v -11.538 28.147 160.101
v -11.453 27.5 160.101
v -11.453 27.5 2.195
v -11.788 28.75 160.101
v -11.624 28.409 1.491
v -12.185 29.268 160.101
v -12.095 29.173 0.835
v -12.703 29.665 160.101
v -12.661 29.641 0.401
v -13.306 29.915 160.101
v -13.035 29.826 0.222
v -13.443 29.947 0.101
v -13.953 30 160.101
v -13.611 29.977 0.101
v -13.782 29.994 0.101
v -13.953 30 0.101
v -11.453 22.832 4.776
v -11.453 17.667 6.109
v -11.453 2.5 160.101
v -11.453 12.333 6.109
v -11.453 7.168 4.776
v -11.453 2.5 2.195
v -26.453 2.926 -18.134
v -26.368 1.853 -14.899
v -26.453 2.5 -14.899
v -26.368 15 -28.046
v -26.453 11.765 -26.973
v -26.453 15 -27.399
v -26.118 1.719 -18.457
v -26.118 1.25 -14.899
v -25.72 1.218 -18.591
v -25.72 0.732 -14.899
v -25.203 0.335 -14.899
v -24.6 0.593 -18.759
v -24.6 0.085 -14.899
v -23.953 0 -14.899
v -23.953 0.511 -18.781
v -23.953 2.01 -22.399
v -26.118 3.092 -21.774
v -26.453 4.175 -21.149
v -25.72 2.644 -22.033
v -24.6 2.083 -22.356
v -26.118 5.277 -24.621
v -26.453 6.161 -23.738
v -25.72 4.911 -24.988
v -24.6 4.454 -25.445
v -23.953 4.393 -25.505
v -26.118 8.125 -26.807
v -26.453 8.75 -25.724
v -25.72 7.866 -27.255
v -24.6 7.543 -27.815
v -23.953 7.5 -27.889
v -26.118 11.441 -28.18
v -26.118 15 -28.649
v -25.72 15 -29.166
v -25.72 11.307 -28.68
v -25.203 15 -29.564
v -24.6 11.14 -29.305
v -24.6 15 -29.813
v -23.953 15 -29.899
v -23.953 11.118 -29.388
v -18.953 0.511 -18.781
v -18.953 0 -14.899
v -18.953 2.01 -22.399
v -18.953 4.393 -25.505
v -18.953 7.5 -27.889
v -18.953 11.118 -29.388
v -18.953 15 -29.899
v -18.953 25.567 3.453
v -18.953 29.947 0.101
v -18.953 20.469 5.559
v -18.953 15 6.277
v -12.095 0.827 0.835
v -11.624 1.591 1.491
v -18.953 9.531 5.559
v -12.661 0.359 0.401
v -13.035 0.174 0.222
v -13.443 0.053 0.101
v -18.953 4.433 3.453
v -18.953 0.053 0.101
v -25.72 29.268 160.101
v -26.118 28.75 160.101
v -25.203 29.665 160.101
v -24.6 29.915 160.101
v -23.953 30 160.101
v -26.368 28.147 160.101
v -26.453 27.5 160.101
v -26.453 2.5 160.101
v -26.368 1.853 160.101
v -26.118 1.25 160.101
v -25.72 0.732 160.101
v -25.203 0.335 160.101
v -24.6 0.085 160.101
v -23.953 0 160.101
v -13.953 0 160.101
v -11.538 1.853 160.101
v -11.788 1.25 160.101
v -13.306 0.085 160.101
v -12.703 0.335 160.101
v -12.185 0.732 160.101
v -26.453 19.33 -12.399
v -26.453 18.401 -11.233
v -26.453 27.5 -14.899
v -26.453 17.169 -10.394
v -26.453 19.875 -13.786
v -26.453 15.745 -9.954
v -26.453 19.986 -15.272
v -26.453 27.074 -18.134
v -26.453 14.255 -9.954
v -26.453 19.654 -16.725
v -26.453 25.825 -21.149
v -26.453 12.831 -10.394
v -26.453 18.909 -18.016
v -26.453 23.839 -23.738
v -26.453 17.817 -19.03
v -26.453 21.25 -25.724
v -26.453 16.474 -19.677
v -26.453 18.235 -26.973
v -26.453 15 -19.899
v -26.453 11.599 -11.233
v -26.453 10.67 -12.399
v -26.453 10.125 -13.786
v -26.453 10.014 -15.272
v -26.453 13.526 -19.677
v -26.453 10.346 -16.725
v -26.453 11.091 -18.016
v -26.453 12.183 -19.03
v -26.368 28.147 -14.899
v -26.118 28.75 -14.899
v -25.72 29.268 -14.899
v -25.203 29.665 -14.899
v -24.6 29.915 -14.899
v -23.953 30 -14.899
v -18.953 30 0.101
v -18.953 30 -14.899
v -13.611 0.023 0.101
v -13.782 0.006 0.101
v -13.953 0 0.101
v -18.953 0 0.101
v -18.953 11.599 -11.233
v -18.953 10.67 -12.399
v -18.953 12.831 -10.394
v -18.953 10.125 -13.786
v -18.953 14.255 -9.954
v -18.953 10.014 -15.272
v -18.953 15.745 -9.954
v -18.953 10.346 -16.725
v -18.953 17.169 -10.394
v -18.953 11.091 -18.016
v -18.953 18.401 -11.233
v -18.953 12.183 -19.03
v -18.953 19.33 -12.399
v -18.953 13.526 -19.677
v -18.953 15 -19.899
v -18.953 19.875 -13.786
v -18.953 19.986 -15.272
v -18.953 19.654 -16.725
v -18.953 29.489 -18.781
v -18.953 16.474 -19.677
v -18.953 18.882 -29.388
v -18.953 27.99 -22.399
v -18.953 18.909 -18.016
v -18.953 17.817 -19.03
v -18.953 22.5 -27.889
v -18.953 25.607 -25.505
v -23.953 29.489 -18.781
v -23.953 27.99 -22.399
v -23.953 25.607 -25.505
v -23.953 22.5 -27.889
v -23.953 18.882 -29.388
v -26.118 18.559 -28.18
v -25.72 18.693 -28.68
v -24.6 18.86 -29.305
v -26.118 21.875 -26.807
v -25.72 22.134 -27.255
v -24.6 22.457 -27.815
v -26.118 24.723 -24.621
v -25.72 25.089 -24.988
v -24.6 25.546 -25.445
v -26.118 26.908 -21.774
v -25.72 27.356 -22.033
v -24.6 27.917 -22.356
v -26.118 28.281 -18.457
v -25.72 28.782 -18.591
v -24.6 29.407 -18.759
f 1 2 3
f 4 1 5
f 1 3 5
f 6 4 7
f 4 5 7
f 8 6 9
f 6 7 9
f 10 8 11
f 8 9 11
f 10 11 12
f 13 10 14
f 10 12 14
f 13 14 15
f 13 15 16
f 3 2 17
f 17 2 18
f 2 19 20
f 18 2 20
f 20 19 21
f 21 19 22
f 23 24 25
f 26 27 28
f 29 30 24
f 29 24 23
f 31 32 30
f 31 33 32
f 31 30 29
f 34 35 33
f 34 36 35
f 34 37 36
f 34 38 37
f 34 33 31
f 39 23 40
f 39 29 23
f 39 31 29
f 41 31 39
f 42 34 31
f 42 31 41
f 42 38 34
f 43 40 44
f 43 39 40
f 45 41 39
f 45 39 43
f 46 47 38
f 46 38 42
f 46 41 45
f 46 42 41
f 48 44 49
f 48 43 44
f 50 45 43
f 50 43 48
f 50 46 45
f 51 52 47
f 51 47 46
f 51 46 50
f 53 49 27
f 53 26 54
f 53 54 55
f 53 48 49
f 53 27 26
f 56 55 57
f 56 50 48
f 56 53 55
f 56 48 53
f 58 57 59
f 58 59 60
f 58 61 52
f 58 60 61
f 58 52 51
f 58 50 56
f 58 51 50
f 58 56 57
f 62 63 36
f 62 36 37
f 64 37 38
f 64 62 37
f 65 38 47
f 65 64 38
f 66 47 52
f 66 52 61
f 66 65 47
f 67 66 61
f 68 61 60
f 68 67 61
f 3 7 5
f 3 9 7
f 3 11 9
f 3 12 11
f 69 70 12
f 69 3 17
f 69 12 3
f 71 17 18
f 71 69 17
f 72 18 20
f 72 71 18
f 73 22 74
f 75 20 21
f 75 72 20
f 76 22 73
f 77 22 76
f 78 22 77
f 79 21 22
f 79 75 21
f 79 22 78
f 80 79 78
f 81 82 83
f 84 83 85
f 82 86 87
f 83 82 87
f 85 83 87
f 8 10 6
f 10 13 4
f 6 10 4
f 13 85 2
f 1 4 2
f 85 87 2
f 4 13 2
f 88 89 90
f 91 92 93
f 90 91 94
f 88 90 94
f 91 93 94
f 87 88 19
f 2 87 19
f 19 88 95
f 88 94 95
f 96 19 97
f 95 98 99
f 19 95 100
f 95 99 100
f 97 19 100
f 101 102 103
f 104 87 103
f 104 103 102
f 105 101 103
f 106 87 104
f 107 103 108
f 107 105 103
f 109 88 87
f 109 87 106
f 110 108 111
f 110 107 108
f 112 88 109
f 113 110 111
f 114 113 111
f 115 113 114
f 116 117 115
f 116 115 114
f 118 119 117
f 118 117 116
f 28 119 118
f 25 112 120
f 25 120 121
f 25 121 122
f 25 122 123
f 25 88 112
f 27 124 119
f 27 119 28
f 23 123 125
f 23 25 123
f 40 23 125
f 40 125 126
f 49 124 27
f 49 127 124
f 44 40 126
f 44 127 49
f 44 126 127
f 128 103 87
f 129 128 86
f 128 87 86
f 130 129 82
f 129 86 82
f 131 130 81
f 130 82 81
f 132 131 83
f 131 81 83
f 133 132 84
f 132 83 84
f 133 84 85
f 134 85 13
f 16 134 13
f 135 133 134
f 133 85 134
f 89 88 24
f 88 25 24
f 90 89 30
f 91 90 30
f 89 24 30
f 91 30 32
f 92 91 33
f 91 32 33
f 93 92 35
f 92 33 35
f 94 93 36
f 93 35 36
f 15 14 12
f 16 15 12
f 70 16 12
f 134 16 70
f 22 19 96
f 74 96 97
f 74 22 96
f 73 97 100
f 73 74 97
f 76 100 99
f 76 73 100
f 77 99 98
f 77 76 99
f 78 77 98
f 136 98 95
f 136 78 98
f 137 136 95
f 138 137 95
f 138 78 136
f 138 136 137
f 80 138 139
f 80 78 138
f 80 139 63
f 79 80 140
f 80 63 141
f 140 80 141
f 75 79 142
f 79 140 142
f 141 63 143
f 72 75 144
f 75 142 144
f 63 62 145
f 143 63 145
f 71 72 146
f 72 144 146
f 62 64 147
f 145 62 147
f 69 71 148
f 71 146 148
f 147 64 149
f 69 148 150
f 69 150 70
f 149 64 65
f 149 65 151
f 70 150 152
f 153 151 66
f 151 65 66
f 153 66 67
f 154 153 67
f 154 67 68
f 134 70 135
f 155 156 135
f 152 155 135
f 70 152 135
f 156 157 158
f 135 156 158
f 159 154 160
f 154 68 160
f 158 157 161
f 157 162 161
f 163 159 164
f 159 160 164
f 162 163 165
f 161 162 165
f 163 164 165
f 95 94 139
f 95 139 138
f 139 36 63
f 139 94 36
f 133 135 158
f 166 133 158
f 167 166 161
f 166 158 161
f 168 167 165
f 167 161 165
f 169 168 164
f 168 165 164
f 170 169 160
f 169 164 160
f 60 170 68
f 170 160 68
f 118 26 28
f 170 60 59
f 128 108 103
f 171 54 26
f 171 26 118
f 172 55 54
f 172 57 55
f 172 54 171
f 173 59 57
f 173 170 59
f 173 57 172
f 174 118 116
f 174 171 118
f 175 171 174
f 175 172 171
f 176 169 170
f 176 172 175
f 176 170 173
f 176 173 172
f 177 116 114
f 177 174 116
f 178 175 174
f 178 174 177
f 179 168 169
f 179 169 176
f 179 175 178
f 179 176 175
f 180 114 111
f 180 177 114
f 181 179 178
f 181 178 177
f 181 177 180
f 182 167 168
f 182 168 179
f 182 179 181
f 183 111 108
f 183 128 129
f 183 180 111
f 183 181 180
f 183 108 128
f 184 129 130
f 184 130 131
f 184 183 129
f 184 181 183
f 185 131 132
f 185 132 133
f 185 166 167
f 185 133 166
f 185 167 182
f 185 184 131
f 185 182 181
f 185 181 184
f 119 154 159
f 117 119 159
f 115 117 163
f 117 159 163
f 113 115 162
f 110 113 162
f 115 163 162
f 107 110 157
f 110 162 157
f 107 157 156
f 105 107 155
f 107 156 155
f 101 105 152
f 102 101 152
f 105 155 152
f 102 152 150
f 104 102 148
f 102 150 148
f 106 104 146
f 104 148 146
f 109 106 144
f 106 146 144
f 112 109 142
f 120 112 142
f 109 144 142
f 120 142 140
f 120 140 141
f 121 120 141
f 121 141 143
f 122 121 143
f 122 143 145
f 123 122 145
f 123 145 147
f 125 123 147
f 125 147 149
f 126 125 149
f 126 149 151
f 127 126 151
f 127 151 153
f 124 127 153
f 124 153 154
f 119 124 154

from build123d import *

# Parameters (mm, degrees)
SKETCH1_W           = 15
SKETCH1_H           = 190
BOSS_EXTRUDE1_DEPTH = 30
SKETCH2_W           = 7.5
SKETCH2_H           = 30
CUT_EXTRUDE1_DEPTH  = 30
SKETCH4_R           = 5
CUT_EXTRUDE2_DEPTH  = 30
FILLET2_R           = 15
SKETCH5_R           = 21.176084542
CUT_EXTRUDE3_DEPTH  = 30
FILLET4_R           = 2.5


with BuildPart() as part:
    # Sketch1 → Boss-Extrude1 (new body)
    with BuildSketch(Plane(origin=(0, 0, 0), x_dir=(1, 0, 0), z_dir=(0, 1, 0))):
        with Locations((-18.952702703, -65.101351351)):
            Rectangle(SKETCH1_W, SKETCH1_H)
    extrude(amount=BOSS_EXTRUDE1_DEPTH)

    # Sketch2 → Cut-Extrude1 (cut)
    with BuildSketch(Plane(origin=(0, 0, -29.898648649), x_dir=(-1, 0, 0), z_dir=(0, 0, -1))):
        with Locations((15.202702703, 15)):
            Rectangle(SKETCH2_W, SKETCH2_H)
    extrude(amount=-CUT_EXTRUDE1_DEPTH, mode=Mode.SUBTRACT)

    # Sketch4 → Cut-Extrude2 (cut)
    with BuildSketch(Plane(origin=(-18.952702703, 0, 0), x_dir=(0, 0, -1), z_dir=(1, 0, 0))):
        with Locations((14.898648649, 15)):
            Circle(SKETCH4_R)
    extrude(amount=-CUT_EXTRUDE2_DEPTH, mode=Mode.SUBTRACT)

    # Fillet2
    fillet2_edges = [part.edges().sort_by_distance(p)[0] for p in [
        (-22.702702703, 0, -29.898648649),
        (-22.702702703, 30, -29.898648649),
    ]]
    fillet(fillet2_edges, radius=FILLET2_R - 0.0001)  # a hair under: the kernel refuses the full size

    # Sketch5 → Cut-Extrude3 (cut)
    with BuildSketch(Plane(origin=(-18.952702703, 0, 0), x_dir=(0, 0, -1), z_dir=(1, 0, 0))):
        with Locations((14.898648649, 15)):
            Circle(SKETCH5_R)
    extrude(amount=CUT_EXTRUDE3_DEPTH, mode=Mode.SUBTRACT)

    # Fillet4
    fillet4_edges = [part.edges().sort_by_distance(p)[0] for p in [
        (-26.452702703, 0, 72.601301351),
        (-26.452702703, 4.393368993, -25.505279656),
        (-26.452702703, 25.606631007, -25.505279656),
        (-26.452702703, 30, 72.601301351),
        (-11.452702703, 30, 80.101351351),
        (-11.452702703, 0, 80.101351351),
    ]]
    fillet(fillet4_edges, radius=FILLET4_R)


solid = part.part
